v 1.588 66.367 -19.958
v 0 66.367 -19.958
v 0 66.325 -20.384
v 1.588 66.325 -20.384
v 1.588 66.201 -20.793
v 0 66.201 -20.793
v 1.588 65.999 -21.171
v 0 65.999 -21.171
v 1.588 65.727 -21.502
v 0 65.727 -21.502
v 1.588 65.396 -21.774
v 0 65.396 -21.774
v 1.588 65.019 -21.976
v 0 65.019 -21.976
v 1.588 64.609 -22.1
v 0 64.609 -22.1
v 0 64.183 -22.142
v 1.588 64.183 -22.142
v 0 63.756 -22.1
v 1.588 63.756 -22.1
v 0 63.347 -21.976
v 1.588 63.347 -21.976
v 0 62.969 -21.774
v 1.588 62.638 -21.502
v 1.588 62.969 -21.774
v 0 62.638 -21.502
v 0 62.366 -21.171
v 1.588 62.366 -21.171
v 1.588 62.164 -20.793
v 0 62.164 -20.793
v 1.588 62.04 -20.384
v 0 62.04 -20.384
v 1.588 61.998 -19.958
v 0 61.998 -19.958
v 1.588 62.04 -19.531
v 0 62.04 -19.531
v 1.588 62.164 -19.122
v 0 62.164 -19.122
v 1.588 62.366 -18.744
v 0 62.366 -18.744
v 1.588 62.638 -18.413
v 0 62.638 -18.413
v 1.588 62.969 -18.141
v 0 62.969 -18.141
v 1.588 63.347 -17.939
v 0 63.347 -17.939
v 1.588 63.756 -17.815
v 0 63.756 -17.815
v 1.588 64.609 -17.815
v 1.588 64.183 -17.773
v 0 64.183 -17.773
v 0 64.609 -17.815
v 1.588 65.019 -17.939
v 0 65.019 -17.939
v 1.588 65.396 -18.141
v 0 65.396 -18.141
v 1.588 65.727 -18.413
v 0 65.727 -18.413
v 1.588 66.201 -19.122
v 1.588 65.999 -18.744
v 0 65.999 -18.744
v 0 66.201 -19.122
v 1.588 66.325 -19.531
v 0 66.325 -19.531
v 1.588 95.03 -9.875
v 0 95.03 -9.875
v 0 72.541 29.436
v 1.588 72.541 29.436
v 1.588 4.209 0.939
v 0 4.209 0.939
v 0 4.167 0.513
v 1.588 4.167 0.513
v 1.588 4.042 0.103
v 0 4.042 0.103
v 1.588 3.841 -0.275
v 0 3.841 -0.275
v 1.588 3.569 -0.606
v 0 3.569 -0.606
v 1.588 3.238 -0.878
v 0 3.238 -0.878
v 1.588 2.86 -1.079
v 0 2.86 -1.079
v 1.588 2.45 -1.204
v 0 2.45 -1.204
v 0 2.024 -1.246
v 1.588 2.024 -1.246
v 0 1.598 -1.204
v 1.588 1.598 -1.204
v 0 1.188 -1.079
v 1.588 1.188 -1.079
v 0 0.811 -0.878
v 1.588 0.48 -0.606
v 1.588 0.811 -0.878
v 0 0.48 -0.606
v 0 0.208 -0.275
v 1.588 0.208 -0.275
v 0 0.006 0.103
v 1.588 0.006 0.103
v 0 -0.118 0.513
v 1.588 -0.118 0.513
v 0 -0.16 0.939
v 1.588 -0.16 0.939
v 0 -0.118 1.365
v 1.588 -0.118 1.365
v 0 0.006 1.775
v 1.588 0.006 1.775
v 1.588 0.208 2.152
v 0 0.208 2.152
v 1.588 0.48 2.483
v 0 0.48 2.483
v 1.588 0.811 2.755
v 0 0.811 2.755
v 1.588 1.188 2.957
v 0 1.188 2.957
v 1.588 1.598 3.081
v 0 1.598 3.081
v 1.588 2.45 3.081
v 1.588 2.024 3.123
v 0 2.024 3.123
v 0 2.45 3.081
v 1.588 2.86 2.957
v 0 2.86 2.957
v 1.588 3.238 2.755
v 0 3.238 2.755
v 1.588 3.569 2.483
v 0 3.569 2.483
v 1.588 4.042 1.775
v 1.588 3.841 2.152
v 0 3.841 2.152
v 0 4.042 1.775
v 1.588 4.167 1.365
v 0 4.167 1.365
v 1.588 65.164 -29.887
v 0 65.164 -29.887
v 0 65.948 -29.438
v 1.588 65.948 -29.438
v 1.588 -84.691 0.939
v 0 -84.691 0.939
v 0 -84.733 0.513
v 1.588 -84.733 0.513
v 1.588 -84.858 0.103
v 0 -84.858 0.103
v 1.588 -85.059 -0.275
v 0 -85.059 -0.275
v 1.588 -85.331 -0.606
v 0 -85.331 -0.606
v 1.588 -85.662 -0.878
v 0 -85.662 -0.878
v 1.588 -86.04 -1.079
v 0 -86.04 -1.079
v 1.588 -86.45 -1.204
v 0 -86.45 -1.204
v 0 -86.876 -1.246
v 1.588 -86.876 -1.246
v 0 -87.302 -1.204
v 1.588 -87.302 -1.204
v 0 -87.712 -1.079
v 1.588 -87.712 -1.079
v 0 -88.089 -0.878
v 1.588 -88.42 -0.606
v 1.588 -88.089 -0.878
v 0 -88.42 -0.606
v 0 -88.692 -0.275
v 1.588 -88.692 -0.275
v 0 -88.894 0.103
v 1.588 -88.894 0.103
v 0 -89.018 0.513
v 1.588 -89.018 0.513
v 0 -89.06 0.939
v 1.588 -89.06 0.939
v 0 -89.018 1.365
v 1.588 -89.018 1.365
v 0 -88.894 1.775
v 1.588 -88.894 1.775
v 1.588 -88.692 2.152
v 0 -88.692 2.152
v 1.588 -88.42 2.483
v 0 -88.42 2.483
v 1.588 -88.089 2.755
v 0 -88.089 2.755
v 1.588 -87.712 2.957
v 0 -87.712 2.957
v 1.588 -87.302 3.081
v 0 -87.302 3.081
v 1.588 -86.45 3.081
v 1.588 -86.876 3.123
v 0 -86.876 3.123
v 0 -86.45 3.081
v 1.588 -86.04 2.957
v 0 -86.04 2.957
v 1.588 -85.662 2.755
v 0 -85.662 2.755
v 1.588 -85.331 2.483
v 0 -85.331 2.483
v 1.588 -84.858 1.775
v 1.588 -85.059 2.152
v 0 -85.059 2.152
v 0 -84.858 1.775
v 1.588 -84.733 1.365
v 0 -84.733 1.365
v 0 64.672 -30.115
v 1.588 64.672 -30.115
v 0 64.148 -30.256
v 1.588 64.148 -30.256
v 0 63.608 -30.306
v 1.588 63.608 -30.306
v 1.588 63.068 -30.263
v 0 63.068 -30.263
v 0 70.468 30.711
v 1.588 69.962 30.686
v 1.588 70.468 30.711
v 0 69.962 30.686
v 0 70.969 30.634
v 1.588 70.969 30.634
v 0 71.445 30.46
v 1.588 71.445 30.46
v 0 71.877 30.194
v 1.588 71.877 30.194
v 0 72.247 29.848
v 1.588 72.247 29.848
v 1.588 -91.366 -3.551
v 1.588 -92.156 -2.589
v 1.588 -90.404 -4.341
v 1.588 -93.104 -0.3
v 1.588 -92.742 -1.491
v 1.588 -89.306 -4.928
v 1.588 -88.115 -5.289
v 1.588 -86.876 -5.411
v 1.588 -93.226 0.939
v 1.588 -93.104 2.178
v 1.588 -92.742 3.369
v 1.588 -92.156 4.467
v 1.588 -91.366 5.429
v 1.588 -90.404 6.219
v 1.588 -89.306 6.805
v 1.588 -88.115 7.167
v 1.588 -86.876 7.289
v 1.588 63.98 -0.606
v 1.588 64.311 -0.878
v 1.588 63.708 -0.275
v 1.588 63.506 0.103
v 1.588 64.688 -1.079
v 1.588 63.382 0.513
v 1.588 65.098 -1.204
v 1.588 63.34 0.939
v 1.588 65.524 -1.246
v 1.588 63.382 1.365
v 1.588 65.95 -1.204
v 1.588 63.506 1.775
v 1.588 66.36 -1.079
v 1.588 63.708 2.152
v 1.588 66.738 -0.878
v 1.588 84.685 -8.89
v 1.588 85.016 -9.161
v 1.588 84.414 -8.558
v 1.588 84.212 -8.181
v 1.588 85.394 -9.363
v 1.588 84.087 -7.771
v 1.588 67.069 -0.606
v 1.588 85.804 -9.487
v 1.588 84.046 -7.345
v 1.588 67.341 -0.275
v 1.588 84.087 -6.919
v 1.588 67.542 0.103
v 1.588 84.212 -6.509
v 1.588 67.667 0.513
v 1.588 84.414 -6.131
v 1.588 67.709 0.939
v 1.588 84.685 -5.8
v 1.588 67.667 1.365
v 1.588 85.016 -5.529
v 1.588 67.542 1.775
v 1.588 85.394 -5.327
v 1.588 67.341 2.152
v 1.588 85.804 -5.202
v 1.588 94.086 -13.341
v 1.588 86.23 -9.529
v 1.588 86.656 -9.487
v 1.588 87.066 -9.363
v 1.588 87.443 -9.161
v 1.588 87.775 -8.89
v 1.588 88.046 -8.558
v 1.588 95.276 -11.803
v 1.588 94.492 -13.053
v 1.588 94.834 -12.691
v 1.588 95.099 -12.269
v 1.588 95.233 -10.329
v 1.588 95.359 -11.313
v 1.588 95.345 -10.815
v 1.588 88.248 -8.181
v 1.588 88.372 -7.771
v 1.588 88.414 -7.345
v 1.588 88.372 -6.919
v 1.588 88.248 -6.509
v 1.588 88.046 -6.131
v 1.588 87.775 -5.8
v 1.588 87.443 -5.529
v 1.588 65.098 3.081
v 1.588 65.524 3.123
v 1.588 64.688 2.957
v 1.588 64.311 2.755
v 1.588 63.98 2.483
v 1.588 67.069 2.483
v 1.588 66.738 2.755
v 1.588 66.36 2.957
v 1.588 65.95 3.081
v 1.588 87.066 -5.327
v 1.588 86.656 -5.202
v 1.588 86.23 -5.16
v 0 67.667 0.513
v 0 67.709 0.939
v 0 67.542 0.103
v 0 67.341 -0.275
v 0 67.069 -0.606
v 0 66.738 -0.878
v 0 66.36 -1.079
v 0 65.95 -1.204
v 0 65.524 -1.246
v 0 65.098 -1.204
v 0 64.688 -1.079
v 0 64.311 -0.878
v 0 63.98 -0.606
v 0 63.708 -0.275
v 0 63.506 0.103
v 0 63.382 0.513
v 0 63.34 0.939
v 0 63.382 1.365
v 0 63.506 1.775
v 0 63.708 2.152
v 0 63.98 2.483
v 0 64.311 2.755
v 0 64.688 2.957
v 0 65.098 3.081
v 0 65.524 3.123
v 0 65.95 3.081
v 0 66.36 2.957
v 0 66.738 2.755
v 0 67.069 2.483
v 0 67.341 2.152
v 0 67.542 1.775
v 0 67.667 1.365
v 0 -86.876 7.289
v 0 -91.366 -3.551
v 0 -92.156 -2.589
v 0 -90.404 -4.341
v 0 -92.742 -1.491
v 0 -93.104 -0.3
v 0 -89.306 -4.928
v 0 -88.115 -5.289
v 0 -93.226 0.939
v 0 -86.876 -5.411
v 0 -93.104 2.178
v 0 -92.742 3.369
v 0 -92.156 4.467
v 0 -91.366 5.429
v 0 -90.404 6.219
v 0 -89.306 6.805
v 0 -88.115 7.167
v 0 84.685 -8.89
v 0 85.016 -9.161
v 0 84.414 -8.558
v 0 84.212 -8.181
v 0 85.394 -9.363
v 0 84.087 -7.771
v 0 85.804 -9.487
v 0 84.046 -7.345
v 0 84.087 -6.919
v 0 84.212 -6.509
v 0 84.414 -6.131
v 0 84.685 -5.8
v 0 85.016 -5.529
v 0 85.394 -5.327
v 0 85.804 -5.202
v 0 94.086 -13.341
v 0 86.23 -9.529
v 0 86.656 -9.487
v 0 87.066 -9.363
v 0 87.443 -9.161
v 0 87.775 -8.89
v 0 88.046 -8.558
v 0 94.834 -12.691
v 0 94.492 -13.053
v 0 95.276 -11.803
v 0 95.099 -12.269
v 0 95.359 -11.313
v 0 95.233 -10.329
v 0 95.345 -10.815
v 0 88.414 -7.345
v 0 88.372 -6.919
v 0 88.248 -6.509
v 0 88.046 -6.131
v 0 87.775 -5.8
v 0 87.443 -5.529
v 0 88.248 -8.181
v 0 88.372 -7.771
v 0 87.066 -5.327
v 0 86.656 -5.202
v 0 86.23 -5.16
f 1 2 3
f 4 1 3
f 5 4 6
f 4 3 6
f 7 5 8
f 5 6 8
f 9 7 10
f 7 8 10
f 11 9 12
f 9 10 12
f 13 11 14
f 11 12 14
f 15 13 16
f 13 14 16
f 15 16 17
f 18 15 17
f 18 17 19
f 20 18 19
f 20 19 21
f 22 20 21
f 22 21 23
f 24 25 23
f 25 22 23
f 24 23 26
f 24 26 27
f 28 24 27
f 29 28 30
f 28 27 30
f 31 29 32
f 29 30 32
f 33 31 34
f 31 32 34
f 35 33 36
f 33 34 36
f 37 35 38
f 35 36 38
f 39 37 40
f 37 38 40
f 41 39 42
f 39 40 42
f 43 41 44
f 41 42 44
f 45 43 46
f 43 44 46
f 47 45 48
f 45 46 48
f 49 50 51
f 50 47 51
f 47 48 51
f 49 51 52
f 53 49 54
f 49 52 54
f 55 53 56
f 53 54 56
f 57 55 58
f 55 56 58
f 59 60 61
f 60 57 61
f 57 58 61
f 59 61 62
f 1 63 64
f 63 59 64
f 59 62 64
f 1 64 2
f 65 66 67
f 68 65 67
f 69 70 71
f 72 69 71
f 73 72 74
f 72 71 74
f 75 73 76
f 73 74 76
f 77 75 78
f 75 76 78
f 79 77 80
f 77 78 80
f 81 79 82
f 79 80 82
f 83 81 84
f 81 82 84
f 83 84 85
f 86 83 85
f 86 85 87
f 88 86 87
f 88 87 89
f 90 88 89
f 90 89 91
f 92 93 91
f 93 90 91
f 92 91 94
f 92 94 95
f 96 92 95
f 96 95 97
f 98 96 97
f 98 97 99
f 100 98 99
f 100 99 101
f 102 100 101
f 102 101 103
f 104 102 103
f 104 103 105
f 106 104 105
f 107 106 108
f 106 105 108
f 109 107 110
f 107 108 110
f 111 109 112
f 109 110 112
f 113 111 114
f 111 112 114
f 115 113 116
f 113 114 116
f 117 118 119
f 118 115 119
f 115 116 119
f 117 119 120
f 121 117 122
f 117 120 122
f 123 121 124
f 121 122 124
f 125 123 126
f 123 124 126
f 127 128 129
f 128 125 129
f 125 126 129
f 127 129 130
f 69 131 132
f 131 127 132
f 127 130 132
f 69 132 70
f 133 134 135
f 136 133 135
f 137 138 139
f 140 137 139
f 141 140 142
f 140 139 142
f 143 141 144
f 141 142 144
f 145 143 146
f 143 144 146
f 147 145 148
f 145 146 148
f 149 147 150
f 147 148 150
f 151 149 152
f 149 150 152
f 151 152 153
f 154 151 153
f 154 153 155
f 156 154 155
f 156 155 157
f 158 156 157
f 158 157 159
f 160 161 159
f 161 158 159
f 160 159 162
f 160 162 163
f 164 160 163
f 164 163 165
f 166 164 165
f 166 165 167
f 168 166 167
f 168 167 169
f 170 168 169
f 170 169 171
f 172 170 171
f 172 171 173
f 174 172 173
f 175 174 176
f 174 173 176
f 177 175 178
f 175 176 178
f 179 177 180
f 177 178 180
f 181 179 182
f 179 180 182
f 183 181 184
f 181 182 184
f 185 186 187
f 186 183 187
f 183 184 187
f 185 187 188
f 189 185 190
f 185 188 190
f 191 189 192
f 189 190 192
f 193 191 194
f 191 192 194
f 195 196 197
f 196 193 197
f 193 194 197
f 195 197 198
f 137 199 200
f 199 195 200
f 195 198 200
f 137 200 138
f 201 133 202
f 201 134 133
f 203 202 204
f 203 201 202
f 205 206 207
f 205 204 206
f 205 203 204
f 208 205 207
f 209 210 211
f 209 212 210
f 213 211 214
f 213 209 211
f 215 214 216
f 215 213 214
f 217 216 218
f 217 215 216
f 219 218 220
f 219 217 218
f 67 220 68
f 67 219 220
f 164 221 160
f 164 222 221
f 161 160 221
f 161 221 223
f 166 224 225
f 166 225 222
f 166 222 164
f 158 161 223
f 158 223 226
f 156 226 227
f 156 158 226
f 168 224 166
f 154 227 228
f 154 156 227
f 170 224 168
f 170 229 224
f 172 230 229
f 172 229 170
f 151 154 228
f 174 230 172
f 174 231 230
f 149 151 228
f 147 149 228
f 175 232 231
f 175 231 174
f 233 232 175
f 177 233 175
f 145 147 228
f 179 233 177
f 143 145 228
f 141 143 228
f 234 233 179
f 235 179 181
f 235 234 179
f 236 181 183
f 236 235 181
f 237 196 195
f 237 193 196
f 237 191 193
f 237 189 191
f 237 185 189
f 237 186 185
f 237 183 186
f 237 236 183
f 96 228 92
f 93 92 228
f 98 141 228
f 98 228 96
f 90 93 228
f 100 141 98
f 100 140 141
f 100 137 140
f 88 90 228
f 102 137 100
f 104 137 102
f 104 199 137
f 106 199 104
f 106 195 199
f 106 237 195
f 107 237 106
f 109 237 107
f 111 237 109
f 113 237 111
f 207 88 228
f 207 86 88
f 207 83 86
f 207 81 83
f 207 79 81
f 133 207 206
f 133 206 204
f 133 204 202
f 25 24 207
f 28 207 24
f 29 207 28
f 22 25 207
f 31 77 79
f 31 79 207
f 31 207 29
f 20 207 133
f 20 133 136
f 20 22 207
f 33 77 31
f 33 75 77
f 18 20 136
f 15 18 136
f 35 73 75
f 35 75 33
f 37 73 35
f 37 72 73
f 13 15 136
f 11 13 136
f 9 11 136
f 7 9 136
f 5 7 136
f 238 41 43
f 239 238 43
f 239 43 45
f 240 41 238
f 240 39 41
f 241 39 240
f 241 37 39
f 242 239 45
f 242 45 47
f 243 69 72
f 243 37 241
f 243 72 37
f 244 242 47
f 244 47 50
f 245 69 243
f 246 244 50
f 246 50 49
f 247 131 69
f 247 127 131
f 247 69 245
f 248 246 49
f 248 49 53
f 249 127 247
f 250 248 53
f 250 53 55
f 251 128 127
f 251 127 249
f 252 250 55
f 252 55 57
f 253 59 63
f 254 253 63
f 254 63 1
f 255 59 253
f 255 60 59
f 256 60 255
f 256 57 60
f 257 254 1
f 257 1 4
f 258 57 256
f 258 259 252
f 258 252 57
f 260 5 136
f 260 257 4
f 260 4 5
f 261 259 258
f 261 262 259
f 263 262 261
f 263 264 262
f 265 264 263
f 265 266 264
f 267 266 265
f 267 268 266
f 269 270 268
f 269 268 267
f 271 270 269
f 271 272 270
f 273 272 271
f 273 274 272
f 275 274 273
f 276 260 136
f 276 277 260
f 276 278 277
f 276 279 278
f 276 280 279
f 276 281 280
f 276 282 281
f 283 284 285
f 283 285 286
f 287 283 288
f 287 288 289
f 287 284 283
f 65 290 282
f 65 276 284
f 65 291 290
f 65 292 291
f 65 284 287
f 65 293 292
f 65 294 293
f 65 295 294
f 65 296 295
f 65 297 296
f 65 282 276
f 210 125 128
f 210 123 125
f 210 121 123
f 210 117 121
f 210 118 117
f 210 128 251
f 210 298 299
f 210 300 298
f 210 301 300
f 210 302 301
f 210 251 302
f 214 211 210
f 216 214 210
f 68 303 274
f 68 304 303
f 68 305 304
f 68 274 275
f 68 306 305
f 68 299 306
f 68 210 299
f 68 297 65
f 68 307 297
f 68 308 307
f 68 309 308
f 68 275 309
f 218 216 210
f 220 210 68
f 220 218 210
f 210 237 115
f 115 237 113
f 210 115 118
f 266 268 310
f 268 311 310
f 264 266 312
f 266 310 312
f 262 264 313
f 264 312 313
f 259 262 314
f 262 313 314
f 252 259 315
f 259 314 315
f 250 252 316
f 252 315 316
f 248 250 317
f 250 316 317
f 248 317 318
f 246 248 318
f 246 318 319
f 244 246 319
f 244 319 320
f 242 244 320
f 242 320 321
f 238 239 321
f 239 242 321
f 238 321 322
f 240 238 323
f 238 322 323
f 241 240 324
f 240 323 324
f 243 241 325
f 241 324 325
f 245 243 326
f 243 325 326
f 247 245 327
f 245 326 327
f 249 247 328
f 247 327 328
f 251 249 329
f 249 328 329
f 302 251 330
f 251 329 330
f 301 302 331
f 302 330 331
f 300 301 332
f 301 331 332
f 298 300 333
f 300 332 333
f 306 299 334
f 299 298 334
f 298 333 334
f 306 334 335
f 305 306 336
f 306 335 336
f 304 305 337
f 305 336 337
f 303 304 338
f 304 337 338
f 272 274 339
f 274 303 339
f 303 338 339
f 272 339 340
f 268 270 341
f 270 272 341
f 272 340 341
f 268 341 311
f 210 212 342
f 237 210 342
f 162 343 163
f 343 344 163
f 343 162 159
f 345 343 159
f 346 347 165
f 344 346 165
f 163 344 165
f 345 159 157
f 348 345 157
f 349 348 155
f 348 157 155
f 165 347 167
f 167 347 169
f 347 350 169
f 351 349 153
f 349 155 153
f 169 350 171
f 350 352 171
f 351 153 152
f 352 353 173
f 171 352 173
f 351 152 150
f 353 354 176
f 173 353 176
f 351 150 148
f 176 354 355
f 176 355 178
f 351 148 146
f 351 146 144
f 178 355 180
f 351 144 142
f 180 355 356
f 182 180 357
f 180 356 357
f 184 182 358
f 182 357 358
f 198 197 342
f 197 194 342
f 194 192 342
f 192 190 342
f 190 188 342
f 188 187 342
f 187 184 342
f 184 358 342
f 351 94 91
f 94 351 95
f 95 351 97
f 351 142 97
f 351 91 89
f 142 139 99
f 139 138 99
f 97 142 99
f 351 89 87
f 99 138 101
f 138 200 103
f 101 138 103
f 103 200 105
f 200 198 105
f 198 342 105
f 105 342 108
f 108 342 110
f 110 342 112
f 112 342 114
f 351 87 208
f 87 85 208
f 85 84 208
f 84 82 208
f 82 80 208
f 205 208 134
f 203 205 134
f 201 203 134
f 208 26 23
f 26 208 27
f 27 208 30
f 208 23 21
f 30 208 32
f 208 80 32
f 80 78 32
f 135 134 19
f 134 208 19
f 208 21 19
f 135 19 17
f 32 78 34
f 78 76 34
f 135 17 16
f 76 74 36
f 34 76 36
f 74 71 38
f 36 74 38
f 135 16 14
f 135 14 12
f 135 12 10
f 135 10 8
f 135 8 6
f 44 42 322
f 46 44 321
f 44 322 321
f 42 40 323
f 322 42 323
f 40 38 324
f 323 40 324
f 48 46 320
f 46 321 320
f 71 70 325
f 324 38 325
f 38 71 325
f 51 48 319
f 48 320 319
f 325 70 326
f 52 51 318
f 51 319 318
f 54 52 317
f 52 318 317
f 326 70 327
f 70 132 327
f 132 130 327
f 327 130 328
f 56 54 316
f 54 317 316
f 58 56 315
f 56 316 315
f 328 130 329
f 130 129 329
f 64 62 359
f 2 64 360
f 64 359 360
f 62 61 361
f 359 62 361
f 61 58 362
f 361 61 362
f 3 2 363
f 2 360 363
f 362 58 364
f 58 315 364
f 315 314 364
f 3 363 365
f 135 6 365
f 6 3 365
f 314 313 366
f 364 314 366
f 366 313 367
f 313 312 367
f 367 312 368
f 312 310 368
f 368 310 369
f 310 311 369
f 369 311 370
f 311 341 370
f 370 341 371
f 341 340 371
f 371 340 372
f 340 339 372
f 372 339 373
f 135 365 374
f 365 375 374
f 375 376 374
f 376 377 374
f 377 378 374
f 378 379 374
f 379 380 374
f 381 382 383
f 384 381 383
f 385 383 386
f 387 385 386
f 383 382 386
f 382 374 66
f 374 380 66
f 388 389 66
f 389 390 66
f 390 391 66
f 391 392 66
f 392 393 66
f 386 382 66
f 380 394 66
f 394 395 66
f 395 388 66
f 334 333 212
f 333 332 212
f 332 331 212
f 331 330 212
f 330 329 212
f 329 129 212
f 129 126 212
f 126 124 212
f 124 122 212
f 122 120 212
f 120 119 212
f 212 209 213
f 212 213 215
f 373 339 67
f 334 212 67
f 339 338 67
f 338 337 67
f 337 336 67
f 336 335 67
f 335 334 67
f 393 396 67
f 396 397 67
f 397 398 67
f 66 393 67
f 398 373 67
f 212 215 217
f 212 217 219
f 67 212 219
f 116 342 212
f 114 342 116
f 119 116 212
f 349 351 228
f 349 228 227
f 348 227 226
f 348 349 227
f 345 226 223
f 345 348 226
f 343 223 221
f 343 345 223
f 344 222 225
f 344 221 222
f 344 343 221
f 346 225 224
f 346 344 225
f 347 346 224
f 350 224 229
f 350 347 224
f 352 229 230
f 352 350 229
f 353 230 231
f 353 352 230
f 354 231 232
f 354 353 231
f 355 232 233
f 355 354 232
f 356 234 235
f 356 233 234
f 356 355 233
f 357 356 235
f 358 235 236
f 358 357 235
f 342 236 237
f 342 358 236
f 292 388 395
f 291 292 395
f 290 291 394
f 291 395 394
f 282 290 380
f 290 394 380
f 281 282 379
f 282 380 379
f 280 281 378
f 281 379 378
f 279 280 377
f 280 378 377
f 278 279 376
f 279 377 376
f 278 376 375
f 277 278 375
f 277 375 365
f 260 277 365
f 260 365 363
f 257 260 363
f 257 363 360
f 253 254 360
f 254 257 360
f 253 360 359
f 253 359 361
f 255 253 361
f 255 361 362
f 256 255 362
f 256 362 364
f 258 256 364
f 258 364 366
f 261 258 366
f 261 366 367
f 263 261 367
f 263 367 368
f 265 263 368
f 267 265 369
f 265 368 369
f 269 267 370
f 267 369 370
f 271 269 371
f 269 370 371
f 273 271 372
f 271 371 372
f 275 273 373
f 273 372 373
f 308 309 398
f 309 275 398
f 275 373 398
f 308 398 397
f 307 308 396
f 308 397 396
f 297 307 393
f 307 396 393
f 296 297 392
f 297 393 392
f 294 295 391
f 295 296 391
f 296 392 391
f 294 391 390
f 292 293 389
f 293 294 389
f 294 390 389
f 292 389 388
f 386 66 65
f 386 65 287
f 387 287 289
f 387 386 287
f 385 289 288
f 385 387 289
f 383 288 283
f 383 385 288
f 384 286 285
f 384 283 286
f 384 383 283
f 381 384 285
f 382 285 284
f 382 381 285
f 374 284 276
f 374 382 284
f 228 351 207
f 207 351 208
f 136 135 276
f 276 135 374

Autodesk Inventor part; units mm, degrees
ref_plane "YZ Plane" through (0, 0, 0) normal (1, 0, 0) x (0, 1, 0)
ref_plane "XZ Plane" through (0, 0, 0) normal (0, 1, 0) x (-1, 0, 0)
ref_plane "XY Plane" through (0, 0, 0) normal (0, 0, 1) x (1, 0, 0)
sketch "Sketch1" plane through (0, 0, 0) normal (1, 0, 0) x (0, 1, 0)
  circle A0 centre (-86.8757, 0.9387) radius 2.1844
  circle A1 centre (2.0243, 0.9387) radius 2.1844
  circle A2 centre (65.5243, 0.9387) radius 2.1844
  circle A3 centre (64.1826, -19.9575) radius 2.1844
  circle A4 centre (86.2299, -7.3449) radius 2.1844
  line L0 (65.9484, -29.438) -> (95.1218, -12.7487)
  circle A5 centre (64.1826, -19.9575) radius 2.1844
  circle A6 centre (65.5243, 0.9387) radius 2.1844
  circle A7 centre (86.2299, -7.3449) radius 2.1844
  circle A8 centre (2.0243, 0.9387) radius 2.1844
  circle A9 centre (-86.8757, 0.9387) radius 2.1844
  circle A10 centre (-86.8757, 0.9387) radius 6.35
  line L1 (-86.8757, -5.4113) -> (63.0678, -30.2634)
  line L2 (65.1635, -29.887) -> (94.0863, -13.341)
  line L3 (95.0298, -9.8751) -> (72.5412, 29.4356)
  line L4 (69.9617, 30.6865) -> (-86.8757, 7.2887)
  arc A11 (63.0678, -30.2634) -> (65.1635, -29.887) centre (63.5869, -27.1311) ccw
  arc A12 (94.0863, -13.341) -> (95.0298, -9.8751) centre (92.8251, -11.1363) ccw
  arc A13 (72.5412, 29.4356) -> (69.9617, 30.6865) centre (70.3364, 28.1743) ccw
  point P0 (0, 0)
  point P1 (96.291, -12.0798)
  dimension "d0" = 12.7
  dimension "d1" = 3.175
  dimension "d2" = 2.54
extrude "Extrusion1" add sketch "Sketch1" along normal blind 1.5875
properties part number "prerollernew"
